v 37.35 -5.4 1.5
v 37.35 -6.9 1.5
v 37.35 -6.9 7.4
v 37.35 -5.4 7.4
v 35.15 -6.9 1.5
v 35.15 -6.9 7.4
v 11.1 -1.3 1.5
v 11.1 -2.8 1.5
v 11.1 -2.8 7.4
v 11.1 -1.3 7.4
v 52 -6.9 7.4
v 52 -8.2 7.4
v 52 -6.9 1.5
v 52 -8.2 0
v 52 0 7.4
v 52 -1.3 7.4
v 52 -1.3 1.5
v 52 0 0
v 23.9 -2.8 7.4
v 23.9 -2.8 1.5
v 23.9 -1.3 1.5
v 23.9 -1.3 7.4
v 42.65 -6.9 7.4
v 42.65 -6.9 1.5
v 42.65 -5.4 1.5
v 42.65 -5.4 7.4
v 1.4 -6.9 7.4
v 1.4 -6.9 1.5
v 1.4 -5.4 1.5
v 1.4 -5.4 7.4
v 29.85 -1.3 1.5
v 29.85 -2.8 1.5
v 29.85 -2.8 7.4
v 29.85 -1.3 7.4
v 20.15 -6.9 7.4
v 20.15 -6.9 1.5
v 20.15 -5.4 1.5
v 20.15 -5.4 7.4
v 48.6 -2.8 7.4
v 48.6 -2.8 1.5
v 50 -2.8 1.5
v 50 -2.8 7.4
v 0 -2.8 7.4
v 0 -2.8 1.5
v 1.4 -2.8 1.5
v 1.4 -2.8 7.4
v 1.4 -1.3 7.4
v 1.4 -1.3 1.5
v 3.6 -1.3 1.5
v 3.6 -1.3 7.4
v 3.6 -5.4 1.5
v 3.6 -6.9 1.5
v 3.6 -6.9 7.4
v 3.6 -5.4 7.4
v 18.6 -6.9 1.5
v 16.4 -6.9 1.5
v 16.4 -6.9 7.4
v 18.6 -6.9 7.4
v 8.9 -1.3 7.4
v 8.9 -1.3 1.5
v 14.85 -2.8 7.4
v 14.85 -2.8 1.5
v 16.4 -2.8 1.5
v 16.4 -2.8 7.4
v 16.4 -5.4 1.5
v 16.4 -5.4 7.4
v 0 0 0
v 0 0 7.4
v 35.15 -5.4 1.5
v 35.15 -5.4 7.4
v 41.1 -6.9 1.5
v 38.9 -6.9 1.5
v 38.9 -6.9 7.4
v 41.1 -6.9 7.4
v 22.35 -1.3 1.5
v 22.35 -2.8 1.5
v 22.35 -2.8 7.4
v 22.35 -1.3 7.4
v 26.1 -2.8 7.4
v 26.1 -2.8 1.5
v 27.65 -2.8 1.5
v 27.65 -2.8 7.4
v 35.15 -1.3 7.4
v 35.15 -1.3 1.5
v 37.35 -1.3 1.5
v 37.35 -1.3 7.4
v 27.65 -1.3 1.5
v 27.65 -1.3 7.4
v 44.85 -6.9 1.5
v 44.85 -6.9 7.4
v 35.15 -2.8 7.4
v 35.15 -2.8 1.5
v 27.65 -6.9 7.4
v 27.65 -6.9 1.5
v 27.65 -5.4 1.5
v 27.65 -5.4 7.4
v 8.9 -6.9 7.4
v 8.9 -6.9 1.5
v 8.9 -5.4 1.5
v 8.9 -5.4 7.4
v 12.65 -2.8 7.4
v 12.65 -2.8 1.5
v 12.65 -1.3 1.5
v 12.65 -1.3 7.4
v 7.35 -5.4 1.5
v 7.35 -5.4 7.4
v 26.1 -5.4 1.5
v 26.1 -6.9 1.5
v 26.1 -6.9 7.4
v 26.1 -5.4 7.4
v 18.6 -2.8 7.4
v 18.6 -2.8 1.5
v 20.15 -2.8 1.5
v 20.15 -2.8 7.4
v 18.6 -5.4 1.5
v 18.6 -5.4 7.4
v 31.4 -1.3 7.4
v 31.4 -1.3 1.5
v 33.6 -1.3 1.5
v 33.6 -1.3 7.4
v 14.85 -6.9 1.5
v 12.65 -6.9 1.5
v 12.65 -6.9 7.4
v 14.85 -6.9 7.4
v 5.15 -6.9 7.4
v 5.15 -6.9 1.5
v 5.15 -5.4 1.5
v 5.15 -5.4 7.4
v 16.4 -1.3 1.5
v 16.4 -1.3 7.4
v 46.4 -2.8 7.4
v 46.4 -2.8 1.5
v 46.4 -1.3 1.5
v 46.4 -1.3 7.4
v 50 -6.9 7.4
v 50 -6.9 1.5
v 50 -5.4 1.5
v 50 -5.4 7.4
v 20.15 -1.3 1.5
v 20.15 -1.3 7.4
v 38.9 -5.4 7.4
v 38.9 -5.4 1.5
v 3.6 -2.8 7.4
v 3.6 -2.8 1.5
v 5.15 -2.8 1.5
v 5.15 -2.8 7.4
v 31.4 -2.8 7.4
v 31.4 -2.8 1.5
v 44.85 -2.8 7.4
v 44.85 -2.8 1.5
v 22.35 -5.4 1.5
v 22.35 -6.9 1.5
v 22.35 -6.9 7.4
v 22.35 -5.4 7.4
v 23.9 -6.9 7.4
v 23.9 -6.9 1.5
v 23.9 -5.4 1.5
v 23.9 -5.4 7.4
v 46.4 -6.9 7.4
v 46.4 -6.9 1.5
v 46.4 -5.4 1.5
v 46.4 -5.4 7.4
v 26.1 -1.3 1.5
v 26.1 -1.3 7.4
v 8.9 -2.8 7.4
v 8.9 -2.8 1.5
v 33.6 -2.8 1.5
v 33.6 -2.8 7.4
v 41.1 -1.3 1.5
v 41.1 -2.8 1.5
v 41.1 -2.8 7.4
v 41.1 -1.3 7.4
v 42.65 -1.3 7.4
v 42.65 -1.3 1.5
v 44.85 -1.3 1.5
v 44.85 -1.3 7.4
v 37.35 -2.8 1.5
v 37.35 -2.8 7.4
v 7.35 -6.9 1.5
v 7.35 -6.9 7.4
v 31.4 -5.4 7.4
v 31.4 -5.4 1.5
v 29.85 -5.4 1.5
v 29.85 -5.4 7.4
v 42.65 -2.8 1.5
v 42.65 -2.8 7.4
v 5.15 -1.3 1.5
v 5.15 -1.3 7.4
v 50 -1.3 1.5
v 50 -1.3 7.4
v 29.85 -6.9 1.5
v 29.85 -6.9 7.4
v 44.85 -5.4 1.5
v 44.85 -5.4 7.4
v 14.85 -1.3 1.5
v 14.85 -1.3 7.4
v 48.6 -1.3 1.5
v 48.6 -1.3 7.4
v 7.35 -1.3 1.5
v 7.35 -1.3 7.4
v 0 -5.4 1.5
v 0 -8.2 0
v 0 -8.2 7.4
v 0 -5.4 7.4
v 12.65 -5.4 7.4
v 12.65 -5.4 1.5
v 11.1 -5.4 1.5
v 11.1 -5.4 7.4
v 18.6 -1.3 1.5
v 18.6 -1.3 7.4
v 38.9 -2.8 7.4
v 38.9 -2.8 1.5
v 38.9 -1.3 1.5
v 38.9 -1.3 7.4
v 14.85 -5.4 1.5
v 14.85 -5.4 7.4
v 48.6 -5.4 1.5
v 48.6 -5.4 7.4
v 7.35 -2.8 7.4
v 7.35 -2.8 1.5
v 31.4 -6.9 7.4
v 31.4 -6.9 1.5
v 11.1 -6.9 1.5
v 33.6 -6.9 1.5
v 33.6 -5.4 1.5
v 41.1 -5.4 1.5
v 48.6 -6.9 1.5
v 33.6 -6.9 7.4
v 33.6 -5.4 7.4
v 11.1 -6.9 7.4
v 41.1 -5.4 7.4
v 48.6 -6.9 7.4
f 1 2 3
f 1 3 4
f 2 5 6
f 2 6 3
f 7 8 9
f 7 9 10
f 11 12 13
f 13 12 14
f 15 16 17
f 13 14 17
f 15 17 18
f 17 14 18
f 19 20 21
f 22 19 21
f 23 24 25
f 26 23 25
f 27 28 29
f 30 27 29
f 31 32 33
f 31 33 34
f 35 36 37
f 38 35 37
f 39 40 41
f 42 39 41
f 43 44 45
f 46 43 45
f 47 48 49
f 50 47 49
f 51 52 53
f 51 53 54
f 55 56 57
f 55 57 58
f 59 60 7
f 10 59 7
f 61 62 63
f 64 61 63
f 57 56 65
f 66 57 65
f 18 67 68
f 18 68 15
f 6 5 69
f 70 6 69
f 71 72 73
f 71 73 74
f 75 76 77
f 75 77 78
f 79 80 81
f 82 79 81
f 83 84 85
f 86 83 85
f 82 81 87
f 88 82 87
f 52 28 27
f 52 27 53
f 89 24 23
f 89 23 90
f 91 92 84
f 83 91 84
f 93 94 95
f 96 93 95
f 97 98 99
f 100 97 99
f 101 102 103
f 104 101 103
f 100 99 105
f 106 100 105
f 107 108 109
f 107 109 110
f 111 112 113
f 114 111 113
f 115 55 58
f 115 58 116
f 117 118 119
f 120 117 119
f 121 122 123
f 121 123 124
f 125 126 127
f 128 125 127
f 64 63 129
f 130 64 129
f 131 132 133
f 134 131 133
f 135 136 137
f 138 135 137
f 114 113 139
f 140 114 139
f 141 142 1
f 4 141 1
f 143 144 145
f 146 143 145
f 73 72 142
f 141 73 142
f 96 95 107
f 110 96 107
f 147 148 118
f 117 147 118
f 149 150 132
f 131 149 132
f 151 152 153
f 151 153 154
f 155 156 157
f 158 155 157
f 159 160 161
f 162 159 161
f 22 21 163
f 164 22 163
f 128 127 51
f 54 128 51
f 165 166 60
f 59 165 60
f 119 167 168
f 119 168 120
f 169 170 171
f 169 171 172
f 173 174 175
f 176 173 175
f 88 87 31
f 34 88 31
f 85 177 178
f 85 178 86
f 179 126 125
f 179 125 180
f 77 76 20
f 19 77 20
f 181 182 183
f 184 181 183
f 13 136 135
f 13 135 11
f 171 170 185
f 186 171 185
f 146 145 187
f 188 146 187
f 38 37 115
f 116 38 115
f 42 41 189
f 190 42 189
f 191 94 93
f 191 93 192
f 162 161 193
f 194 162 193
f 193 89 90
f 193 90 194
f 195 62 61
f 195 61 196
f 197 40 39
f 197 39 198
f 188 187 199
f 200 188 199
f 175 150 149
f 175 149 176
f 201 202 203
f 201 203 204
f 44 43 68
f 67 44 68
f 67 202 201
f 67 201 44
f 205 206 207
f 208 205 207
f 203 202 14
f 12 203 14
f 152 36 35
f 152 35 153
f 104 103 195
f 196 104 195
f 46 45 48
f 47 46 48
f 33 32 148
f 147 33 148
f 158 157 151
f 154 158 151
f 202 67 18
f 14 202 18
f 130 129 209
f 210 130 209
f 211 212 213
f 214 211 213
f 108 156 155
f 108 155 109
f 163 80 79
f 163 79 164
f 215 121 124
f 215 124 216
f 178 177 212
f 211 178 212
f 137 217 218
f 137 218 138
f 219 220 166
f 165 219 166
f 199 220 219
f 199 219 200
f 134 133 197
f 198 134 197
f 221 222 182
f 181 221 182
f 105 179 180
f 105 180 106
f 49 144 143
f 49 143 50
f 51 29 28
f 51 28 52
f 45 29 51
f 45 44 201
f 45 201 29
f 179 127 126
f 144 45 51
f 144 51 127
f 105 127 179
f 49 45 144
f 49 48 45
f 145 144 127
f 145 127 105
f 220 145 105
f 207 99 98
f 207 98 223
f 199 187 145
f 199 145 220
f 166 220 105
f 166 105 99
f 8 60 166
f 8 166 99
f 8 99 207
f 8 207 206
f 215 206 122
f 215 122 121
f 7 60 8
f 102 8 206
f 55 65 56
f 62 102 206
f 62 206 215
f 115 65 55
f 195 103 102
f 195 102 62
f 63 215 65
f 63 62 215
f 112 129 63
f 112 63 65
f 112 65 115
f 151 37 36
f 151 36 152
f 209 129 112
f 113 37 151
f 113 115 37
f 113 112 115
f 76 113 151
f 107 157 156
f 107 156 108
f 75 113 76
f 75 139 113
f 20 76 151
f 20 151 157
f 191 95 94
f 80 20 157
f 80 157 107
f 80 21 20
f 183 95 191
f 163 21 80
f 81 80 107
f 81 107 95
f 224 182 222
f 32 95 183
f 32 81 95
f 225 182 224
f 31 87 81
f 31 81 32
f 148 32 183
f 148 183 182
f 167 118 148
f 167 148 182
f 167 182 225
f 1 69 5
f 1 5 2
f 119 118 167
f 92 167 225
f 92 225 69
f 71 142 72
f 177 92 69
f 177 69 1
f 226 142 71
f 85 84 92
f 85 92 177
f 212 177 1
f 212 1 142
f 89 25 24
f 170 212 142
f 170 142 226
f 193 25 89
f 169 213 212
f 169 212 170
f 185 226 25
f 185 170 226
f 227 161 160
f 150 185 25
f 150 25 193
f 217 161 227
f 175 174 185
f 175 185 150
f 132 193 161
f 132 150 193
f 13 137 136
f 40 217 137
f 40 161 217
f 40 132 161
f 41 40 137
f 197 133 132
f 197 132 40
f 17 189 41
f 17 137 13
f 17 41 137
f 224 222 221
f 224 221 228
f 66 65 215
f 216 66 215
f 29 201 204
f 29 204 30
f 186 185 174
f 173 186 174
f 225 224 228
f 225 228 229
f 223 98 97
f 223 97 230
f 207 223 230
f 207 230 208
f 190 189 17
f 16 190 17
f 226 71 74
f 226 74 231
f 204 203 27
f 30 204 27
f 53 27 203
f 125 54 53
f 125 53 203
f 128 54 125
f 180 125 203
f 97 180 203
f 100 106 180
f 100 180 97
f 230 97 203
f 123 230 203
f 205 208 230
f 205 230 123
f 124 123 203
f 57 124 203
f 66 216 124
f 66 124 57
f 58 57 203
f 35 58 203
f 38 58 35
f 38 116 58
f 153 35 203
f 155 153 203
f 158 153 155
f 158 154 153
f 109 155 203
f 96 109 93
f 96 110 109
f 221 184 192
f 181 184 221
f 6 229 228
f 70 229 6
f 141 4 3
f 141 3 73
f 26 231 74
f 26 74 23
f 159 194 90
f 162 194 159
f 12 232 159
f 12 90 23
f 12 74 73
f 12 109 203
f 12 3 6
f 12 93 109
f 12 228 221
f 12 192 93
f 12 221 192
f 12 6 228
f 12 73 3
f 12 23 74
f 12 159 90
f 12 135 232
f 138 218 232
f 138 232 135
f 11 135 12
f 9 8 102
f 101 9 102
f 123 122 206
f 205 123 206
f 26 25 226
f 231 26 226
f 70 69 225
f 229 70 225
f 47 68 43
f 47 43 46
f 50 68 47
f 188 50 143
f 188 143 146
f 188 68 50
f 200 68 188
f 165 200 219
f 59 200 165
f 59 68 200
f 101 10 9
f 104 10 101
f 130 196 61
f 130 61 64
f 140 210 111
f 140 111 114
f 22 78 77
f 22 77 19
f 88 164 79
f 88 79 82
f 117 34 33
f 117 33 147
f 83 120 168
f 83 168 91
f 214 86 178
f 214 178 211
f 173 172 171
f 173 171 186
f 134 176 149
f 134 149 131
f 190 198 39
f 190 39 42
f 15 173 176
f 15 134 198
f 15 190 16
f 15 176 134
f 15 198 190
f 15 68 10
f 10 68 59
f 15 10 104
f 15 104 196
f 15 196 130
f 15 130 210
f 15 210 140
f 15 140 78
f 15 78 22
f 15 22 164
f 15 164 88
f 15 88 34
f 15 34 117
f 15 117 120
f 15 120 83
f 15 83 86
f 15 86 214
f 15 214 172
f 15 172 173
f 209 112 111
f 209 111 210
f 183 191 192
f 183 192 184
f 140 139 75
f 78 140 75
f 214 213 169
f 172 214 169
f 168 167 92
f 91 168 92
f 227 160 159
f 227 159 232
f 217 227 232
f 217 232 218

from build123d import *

# Parameters (mm, degrees)
F1_W     = 52
F1_H     = 1.3
F1_H_2   = 5.6
F2_DEPTH = 1.5
F3_DEPTH = 7.4
F4_W     = 1.4
F4_H     = 1.5
F4_W_2   = 0.15
F4_W_3   = 1.25
F5_DEPTH = 5.9


with BuildPart() as f2:
    # F1 (on Top) → F2 (new body)
    with BuildSketch(Plane.XY):
        with Locations((26, -0.65)):
            Rectangle(F1_W, F1_H)
        with Locations((26, -4.1)):
            Rectangle(F1_W, F1_H_2)
        with Locations((26, -7.55)):
            Rectangle(F1_W, F1_H)
    extrude(amount=F2_DEPTH)

    # F1 (on Top) → F3 (join)
    with BuildSketch(Plane.XY):
        with Locations((26, -7.55)):
            Rectangle(F1_W, F1_H)
        with Locations((26, -0.65)):
            Rectangle(F1_W, F1_H)
    extrude(amount=F3_DEPTH)

    # F4 (on face) → F5 (join)
    with BuildSketch(Plane.XY.offset(1.5)):
        with Locations((0.7, -2.05)):
            Rectangle(F4_W, F4_H)
        with Locations((0.7, -6.15)):
            Rectangle(F4_W, F4_H)
        with Locations((3.675, -2.05)):
            Rectangle(F4_W_2, F4_H)
        with Locations((4.375, -2.05)):
            Rectangle(F4_W_3, F4_H)
        with Locations((5.075, -2.05)):
            Rectangle(F4_W_2, F4_H)
        with Locations((3.675, -6.15)):
            Rectangle(F4_W_2, F4_H)
        with Locations((4.375, -6.15)):
            Rectangle(F4_W_3, F4_H)
        with Locations((5.075, -6.15)):
            Rectangle(F4_W_2, F4_H)
        with Locations((7.425, -2.05)):
            Rectangle(F4_W_2, F4_H)
        with Locations((8.125, -2.05)):
            Rectangle(F4_W_3, F4_H)
        with Locations((8.825, -2.05)):
            Rectangle(F4_W_2, F4_H)
        with Locations((7.425, -6.15)):
            Rectangle(F4_W_2, F4_H)
        with Locations((8.125, -6.15)):
            Rectangle(F4_W_3, F4_H)
        with Locations((8.825, -6.15)):
            Rectangle(F4_W_2, F4_H)
        with Locations((11.175, -2.05)):
            Rectangle(F4_W_2, F4_H)
        with Locations((11.875, -2.05)):
            Rectangle(F4_W_3, F4_H)
        with Locations((12.575, -2.05)):
            Rectangle(F4_W_2, F4_H)
        with Locations((11.175, -6.15)):
            Rectangle(F4_W_2, F4_H)
        with Locations((11.875, -6.15)):
            Rectangle(F4_W_3, F4_H)
        with Locations((12.575, -6.15)):
            Rectangle(F4_W_2, F4_H)
        with Locations((14.925, -2.05)):
            Rectangle(F4_W_2, F4_H)
        with Locations((15.625, -2.05)):
            Rectangle(F4_W_3, F4_H)
        with Locations((16.325, -2.05)):
            Rectangle(F4_W_2, F4_H)
        with Locations((14.925, -6.15)):
            Rectangle(F4_W_2, F4_H)
        with Locations((15.625, -6.15)):
            Rectangle(F4_W_3, F4_H)
        with Locations((16.325, -6.15)):
            Rectangle(F4_W_2, F4_H)
        with Locations((18.675, -2.05)):
            Rectangle(F4_W_2, F4_H)
        with Locations((19.375, -2.05)):
            Rectangle(F4_W_3, F4_H)
        with Locations((20.075, -2.05)):
            Rectangle(F4_W_2, F4_H)
        with Locations((18.675, -6.15)):
            Rectangle(F4_W_2, F4_H)
        with Locations((19.375, -6.15)):
            Rectangle(F4_W_3, F4_H)
        with Locations((20.075, -6.15)):
            Rectangle(F4_W_2, F4_H)
        with Locations((22.425, -2.05)):
            Rectangle(F4_W_2, F4_H)
        with Locations((23.125, -2.05)):
            Rectangle(F4_W_3, F4_H)
        with Locations((23.825, -2.05)):
            Rectangle(F4_W_2, F4_H)
        with Locations((22.425, -6.15)):
            Rectangle(F4_W_2, F4_H)
        with Locations((23.125, -6.15)):
            Rectangle(F4_W_3, F4_H)
        with Locations((23.825, -6.15)):
            Rectangle(F4_W_2, F4_H)
        with Locations((26.175, -2.05)):
            Rectangle(F4_W_2, F4_H)
        with Locations((26.875, -2.05)):
            Rectangle(F4_W_3, F4_H)
        with Locations((27.575, -2.05)):
            Rectangle(F4_W_2, F4_H)
        with Locations((26.175, -6.15)):
            Rectangle(F4_W_2, F4_H)
        with Locations((26.875, -6.15)):
            Rectangle(F4_W_3, F4_H)
        with Locations((27.575, -6.15)):
            Rectangle(F4_W_2, F4_H)
        with Locations((29.925, -2.05)):
            Rectangle(F4_W_2, F4_H)
        with Locations((30.625, -2.05)):
            Rectangle(F4_W_3, F4_H)
        with Locations((31.325, -2.05)):
            Rectangle(F4_W_2, F4_H)
        with Locations((29.925, -6.15)):
            Rectangle(F4_W_2, F4_H)
        with Locations((30.625, -6.15)):
            Rectangle(F4_W_3, F4_H)
        with Locations((31.325, -6.15)):
            Rectangle(F4_W_2, F4_H)
        with Locations((33.675, -2.05)):
            Rectangle(F4_W_2, F4_H)
        with Locations((34.375, -2.05)):
            Rectangle(F4_W_3, F4_H)
        with Locations((35.075, -2.05)):
            Rectangle(F4_W_2, F4_H)
        with Locations((33.675, -6.15)):
            Rectangle(F4_W_2, F4_H)
        with Locations((34.375, -6.15)):
            Rectangle(F4_W_3, F4_H)
        with Locations((35.075, -6.15)):
            Rectangle(F4_W_2, F4_H)
        with Locations((37.425, -2.05)):
            Rectangle(F4_W_2, F4_H)
        with Locations((38.125, -2.05)):
            Rectangle(F4_W_3, F4_H)
        with Locations((38.825, -2.05)):
            Rectangle(F4_W_2, F4_H)
        with Locations((37.425, -6.15)):
            Rectangle(F4_W_2, F4_H)
        with Locations((38.125, -6.15)):
            Rectangle(F4_W_3, F4_H)
        with Locations((38.825, -6.15)):
            Rectangle(F4_W_2, F4_H)
        with Locations((41.175, -2.05)):
            Rectangle(F4_W_2, F4_H)
        with Locations((41.875, -2.05)):
            Rectangle(F4_W_3, F4_H)
        with Locations((42.575, -2.05)):
            Rectangle(F4_W_2, F4_H)
        with Locations((41.175, -6.15)):
            Rectangle(F4_W_2, F4_H)
        with Locations((41.875, -6.15)):
            Rectangle(F4_W_3, F4_H)
        with Locations((42.575, -6.15)):
            Rectangle(F4_W_2, F4_H)
        with Locations((44.925, -2.05)):
            Rectangle(F4_W_2, F4_H)
        with Locations((45.625, -2.05)):
            Rectangle(F4_W_3, F4_H)
        with Locations((46.325, -2.05)):
            Rectangle(F4_W_2, F4_H)
        with Locations((44.925, -6.15)):
            Rectangle(F4_W_2, F4_H)
        with Locations((45.625, -6.15)):
            Rectangle(F4_W_3, F4_H)
        with Locations((46.325, -6.15)):
            Rectangle(F4_W_2, F4_H)
        with Locations((49.3, -2.05)):
            Rectangle(F4_W, F4_H)
        with Locations((49.3, -6.15)):
            Rectangle(F4_W, F4_H)
    extrude(amount=F5_DEPTH)


solid = f2.part
